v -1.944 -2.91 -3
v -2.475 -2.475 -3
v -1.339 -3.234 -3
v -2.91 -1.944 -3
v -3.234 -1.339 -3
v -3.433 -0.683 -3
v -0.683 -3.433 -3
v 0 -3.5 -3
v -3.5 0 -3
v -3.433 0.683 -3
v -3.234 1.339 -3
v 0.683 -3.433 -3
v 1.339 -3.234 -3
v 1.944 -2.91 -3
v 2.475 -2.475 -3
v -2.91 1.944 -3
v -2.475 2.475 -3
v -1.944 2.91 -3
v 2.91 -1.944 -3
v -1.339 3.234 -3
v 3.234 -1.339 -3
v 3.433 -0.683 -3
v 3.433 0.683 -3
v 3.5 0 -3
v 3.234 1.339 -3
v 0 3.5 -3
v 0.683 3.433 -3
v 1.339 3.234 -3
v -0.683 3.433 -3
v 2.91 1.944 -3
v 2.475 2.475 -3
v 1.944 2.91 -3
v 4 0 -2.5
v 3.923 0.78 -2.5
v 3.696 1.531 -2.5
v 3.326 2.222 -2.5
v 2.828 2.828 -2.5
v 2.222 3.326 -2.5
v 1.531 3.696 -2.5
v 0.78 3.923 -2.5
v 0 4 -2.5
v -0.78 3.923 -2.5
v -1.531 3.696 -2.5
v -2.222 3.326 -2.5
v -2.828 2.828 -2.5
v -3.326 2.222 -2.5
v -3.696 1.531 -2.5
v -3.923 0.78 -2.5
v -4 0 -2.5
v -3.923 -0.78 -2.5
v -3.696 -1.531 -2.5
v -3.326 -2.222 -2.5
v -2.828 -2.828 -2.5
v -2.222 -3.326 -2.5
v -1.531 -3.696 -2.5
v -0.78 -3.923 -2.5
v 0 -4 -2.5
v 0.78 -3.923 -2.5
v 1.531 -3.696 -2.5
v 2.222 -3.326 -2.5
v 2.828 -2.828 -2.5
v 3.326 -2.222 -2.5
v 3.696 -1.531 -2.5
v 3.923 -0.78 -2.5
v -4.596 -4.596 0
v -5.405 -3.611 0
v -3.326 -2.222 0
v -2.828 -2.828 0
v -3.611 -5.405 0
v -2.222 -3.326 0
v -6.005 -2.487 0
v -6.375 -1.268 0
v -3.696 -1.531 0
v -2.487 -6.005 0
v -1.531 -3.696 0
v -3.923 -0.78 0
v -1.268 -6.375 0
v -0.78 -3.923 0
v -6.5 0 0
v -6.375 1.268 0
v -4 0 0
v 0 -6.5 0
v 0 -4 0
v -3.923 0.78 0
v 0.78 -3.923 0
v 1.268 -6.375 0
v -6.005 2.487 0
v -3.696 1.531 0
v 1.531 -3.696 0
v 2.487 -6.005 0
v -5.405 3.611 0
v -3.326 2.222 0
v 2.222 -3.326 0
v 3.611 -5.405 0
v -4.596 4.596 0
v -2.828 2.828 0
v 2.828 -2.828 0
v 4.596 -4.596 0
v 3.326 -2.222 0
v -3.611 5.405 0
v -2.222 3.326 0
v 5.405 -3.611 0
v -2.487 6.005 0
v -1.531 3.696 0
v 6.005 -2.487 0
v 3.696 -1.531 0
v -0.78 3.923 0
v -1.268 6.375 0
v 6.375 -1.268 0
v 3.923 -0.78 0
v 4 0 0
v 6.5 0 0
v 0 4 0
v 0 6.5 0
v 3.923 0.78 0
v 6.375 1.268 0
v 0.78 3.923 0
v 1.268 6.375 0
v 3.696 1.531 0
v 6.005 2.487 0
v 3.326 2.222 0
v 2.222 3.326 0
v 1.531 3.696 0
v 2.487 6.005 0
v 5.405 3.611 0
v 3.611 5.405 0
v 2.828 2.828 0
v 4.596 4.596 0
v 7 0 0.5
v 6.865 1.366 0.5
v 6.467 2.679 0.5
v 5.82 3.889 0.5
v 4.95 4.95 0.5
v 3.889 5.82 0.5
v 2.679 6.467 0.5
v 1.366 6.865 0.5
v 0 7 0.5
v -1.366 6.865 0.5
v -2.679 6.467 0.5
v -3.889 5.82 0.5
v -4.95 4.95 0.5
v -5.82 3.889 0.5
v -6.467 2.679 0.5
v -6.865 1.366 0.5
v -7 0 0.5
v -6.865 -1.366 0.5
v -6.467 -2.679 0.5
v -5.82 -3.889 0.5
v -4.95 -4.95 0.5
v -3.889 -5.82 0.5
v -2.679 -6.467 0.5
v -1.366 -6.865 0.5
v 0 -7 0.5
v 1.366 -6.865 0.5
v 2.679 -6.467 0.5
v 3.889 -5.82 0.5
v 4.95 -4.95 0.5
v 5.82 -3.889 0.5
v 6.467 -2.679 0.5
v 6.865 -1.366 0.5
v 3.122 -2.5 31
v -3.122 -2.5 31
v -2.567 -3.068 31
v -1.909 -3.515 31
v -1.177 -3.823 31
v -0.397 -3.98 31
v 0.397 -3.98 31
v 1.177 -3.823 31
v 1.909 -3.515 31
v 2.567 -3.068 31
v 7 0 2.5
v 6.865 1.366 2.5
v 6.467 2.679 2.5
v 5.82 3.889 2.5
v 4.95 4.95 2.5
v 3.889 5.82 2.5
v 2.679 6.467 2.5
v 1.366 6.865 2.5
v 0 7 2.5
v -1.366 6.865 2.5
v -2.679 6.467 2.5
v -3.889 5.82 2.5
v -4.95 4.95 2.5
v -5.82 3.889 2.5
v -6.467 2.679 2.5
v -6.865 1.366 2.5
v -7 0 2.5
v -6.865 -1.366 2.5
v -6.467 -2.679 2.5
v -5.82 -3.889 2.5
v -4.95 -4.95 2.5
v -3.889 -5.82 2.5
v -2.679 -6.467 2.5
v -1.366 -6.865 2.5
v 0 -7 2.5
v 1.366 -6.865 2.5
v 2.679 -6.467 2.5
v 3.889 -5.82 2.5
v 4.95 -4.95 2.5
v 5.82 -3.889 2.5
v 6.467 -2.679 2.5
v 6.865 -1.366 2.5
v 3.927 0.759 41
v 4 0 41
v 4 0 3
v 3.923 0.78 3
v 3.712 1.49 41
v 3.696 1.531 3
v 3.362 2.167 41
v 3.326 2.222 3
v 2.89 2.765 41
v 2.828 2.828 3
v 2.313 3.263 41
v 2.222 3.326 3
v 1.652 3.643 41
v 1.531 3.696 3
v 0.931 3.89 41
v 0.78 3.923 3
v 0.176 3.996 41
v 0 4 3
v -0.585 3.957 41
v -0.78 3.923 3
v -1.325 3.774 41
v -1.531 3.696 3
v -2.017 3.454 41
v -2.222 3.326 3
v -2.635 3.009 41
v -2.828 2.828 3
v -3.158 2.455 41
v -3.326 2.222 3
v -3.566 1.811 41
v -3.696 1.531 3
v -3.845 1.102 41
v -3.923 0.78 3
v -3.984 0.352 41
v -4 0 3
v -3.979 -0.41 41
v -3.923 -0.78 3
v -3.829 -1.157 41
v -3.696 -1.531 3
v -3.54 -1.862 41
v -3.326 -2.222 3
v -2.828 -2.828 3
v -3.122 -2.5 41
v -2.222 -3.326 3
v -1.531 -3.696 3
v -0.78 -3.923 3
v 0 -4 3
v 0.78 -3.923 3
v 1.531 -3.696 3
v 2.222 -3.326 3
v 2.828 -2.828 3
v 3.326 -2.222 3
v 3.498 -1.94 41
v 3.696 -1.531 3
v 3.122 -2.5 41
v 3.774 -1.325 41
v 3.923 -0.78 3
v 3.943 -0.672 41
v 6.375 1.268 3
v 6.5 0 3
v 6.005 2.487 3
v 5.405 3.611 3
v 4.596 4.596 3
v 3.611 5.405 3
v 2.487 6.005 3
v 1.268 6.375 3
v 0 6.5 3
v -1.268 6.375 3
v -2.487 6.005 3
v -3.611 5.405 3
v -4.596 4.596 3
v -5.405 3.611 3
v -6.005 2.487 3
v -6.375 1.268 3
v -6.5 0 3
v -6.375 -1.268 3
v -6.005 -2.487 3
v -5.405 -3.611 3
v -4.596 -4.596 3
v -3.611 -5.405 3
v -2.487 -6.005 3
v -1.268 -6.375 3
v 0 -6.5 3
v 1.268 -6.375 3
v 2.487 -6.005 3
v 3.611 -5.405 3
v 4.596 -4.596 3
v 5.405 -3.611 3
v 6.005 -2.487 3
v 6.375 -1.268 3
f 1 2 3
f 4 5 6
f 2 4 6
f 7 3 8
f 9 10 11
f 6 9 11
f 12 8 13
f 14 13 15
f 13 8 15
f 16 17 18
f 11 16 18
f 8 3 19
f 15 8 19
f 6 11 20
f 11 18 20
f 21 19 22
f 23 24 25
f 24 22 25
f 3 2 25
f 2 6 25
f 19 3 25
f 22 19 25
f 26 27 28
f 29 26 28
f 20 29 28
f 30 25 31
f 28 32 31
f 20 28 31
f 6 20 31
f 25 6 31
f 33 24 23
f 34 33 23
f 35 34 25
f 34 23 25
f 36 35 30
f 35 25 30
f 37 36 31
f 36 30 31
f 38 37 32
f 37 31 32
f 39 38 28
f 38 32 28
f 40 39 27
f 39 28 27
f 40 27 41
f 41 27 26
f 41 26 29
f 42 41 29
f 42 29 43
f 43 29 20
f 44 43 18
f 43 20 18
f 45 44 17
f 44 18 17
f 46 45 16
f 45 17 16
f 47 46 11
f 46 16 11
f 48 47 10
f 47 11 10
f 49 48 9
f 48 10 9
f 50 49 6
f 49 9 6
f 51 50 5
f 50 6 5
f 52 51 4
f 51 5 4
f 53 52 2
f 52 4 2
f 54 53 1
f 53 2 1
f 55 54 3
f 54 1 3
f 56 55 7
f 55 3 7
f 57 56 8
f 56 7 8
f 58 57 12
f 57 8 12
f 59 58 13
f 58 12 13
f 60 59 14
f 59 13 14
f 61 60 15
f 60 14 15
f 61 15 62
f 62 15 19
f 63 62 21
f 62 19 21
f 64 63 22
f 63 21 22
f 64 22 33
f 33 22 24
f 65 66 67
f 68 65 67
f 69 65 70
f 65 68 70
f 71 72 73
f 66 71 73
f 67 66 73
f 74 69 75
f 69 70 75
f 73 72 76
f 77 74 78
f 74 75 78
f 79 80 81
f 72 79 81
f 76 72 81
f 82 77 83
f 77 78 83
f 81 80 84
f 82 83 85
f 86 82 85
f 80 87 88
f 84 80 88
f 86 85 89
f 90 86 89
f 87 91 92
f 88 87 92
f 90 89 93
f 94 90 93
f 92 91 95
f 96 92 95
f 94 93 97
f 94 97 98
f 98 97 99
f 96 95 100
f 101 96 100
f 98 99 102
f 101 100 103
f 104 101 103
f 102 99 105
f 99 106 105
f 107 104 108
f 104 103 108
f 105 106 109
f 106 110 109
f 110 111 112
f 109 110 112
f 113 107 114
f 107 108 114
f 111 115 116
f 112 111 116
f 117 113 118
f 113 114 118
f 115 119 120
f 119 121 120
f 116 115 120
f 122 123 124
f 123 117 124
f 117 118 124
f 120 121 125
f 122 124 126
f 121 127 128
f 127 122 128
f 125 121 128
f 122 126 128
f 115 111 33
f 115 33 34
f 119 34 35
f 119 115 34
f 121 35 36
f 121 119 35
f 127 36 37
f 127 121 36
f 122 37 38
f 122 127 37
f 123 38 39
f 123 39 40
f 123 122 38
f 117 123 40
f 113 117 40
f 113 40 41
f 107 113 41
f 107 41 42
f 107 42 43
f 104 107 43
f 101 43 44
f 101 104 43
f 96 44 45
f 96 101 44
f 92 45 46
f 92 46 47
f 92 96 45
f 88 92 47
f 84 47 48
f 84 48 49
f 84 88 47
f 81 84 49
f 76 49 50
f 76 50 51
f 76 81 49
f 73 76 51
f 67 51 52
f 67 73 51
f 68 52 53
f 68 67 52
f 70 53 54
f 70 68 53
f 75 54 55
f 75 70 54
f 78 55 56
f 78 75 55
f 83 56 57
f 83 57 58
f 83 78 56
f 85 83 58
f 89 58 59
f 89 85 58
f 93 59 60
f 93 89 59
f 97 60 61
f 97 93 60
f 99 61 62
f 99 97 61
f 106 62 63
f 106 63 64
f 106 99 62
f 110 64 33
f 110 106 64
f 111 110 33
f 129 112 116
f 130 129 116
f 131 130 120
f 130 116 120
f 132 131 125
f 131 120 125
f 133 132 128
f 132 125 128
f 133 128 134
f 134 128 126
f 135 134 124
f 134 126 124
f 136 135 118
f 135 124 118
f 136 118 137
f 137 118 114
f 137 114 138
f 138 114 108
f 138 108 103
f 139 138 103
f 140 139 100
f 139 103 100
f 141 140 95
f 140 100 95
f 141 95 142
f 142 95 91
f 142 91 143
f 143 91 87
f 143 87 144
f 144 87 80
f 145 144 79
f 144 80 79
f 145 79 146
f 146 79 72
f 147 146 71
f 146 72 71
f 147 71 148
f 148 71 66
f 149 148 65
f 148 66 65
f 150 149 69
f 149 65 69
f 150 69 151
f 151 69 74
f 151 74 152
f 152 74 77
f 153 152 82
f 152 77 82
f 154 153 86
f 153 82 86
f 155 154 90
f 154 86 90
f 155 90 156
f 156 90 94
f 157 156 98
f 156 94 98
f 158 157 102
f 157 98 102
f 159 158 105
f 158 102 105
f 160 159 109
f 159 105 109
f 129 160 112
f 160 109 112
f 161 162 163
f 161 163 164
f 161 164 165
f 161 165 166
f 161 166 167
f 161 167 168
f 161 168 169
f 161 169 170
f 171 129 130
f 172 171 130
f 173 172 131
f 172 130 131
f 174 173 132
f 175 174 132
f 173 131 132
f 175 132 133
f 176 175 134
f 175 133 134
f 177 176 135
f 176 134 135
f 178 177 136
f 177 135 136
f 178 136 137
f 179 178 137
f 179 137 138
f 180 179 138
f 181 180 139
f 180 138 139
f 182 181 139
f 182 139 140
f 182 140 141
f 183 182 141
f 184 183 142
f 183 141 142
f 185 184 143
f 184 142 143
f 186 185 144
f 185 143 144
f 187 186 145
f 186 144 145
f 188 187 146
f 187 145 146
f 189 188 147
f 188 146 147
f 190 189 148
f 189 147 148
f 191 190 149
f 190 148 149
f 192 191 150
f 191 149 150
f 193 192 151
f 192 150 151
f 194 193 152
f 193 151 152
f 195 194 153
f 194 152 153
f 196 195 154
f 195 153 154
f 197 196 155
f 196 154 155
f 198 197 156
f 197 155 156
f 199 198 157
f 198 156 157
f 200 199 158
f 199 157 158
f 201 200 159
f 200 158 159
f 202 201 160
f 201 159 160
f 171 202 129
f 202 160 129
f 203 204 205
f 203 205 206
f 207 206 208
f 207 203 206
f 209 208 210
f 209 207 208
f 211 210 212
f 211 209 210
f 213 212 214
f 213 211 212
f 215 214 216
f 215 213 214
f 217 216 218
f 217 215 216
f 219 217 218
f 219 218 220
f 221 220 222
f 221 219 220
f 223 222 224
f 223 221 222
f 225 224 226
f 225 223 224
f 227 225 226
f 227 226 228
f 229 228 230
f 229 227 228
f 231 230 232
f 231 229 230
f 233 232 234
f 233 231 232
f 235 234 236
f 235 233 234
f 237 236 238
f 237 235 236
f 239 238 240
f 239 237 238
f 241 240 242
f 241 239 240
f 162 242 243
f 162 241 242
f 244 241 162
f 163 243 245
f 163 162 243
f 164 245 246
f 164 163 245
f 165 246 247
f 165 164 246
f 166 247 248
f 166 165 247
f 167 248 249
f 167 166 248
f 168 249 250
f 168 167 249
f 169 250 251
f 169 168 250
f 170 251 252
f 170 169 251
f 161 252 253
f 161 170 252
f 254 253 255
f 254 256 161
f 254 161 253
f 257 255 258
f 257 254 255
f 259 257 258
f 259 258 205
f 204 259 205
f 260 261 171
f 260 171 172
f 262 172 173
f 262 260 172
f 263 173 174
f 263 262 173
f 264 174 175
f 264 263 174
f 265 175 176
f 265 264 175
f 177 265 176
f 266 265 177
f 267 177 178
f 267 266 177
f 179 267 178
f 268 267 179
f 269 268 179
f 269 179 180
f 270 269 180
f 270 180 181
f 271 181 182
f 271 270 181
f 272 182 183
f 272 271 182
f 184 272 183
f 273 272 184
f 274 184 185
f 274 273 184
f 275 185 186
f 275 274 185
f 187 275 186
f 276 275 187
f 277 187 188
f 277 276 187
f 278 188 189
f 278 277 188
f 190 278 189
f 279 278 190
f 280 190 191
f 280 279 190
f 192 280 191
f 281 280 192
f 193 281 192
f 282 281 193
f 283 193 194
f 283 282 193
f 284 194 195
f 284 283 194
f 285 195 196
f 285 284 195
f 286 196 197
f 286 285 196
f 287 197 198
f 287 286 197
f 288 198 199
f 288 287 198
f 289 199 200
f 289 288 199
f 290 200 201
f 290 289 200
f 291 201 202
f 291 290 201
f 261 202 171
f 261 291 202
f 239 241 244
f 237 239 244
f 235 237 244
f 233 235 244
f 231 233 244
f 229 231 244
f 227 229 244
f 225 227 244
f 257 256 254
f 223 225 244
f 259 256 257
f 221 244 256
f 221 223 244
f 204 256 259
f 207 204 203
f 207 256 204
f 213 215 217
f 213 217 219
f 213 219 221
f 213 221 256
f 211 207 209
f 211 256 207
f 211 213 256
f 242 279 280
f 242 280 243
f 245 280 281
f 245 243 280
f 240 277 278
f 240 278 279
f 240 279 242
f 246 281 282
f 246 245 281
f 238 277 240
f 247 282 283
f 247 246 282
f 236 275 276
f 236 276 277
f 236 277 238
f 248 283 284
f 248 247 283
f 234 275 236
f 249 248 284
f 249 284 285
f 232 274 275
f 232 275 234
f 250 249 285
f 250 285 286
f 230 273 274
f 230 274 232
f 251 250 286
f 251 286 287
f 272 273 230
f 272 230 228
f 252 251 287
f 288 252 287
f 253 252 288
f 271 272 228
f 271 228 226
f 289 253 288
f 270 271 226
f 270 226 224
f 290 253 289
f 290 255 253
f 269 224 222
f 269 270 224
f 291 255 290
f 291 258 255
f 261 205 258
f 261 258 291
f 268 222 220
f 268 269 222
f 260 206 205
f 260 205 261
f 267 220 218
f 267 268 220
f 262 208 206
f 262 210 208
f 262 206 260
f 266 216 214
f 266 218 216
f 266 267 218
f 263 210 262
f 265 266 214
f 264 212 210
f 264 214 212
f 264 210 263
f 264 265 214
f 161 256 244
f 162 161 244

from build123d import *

# Parameters (mm, degrees)
F0_R     = 4
F1_DEPTH = 41
F2_DEPTH = 3
F0_R_2   = 7
F3_DEPTH = 3
F5_DEPTH = 10
F6_SIZE2 = 0.5
F6_SIZE  = 0.5
F7_SIZE2 = 0.5
F7_SIZE  = 0.5
F8_SIZE2 = 0.5
F8_SIZE  = 0.5


with BuildPart() as f1:
    # F0 (on Top) → F1 (new body)
    with BuildSketch(Plane.XY):
        Circle(F0_R)
    extrude(amount=F1_DEPTH)

    # F0 (on Top) → F2 (join)
    with BuildSketch(Plane.XY):
        Circle(F0_R)
    extrude(amount=-F2_DEPTH)

    # F0 (on Top) → F3 (join)
    with BuildSketch(Plane.XY):
        Circle(F0_R_2)
        Circle(F0_R, mode=Mode.SUBTRACT)
    extrude(amount=F3_DEPTH)

    # F4 (on face) → F5 (cut)
    with BuildSketch(Plane.XY.offset(41)):
        Polygon((4.573411, -5.26242), (4.573411, -2.5), (0, -2.5), (-4.510589, -2.5), (-4.510589, -5.26242), align=None)
    extrude(amount=-F5_DEPTH, mode=Mode.SUBTRACT)

    # F6
    f6_edges = [f1.edges().sort_by_distance(p)[0] for p in [
        (-7, 0, 3),
    ]]
    chamfer(f6_edges, length=F6_SIZE, length2=F6_SIZE2)

    # F7
    f7_edges = [f1.edges().sort_by_distance(p)[0] for p in [
        (-7, 0, 0),
    ]]
    chamfer(f7_edges, length=F7_SIZE, length2=F7_SIZE2)

    # F8
    f8_edges = [f1.edges().sort_by_distance(p)[0] for p in [
        (-4, 0, -3),
    ]]
    chamfer(f8_edges, length=F8_SIZE, length2=F8_SIZE2)


solid = f1.part
